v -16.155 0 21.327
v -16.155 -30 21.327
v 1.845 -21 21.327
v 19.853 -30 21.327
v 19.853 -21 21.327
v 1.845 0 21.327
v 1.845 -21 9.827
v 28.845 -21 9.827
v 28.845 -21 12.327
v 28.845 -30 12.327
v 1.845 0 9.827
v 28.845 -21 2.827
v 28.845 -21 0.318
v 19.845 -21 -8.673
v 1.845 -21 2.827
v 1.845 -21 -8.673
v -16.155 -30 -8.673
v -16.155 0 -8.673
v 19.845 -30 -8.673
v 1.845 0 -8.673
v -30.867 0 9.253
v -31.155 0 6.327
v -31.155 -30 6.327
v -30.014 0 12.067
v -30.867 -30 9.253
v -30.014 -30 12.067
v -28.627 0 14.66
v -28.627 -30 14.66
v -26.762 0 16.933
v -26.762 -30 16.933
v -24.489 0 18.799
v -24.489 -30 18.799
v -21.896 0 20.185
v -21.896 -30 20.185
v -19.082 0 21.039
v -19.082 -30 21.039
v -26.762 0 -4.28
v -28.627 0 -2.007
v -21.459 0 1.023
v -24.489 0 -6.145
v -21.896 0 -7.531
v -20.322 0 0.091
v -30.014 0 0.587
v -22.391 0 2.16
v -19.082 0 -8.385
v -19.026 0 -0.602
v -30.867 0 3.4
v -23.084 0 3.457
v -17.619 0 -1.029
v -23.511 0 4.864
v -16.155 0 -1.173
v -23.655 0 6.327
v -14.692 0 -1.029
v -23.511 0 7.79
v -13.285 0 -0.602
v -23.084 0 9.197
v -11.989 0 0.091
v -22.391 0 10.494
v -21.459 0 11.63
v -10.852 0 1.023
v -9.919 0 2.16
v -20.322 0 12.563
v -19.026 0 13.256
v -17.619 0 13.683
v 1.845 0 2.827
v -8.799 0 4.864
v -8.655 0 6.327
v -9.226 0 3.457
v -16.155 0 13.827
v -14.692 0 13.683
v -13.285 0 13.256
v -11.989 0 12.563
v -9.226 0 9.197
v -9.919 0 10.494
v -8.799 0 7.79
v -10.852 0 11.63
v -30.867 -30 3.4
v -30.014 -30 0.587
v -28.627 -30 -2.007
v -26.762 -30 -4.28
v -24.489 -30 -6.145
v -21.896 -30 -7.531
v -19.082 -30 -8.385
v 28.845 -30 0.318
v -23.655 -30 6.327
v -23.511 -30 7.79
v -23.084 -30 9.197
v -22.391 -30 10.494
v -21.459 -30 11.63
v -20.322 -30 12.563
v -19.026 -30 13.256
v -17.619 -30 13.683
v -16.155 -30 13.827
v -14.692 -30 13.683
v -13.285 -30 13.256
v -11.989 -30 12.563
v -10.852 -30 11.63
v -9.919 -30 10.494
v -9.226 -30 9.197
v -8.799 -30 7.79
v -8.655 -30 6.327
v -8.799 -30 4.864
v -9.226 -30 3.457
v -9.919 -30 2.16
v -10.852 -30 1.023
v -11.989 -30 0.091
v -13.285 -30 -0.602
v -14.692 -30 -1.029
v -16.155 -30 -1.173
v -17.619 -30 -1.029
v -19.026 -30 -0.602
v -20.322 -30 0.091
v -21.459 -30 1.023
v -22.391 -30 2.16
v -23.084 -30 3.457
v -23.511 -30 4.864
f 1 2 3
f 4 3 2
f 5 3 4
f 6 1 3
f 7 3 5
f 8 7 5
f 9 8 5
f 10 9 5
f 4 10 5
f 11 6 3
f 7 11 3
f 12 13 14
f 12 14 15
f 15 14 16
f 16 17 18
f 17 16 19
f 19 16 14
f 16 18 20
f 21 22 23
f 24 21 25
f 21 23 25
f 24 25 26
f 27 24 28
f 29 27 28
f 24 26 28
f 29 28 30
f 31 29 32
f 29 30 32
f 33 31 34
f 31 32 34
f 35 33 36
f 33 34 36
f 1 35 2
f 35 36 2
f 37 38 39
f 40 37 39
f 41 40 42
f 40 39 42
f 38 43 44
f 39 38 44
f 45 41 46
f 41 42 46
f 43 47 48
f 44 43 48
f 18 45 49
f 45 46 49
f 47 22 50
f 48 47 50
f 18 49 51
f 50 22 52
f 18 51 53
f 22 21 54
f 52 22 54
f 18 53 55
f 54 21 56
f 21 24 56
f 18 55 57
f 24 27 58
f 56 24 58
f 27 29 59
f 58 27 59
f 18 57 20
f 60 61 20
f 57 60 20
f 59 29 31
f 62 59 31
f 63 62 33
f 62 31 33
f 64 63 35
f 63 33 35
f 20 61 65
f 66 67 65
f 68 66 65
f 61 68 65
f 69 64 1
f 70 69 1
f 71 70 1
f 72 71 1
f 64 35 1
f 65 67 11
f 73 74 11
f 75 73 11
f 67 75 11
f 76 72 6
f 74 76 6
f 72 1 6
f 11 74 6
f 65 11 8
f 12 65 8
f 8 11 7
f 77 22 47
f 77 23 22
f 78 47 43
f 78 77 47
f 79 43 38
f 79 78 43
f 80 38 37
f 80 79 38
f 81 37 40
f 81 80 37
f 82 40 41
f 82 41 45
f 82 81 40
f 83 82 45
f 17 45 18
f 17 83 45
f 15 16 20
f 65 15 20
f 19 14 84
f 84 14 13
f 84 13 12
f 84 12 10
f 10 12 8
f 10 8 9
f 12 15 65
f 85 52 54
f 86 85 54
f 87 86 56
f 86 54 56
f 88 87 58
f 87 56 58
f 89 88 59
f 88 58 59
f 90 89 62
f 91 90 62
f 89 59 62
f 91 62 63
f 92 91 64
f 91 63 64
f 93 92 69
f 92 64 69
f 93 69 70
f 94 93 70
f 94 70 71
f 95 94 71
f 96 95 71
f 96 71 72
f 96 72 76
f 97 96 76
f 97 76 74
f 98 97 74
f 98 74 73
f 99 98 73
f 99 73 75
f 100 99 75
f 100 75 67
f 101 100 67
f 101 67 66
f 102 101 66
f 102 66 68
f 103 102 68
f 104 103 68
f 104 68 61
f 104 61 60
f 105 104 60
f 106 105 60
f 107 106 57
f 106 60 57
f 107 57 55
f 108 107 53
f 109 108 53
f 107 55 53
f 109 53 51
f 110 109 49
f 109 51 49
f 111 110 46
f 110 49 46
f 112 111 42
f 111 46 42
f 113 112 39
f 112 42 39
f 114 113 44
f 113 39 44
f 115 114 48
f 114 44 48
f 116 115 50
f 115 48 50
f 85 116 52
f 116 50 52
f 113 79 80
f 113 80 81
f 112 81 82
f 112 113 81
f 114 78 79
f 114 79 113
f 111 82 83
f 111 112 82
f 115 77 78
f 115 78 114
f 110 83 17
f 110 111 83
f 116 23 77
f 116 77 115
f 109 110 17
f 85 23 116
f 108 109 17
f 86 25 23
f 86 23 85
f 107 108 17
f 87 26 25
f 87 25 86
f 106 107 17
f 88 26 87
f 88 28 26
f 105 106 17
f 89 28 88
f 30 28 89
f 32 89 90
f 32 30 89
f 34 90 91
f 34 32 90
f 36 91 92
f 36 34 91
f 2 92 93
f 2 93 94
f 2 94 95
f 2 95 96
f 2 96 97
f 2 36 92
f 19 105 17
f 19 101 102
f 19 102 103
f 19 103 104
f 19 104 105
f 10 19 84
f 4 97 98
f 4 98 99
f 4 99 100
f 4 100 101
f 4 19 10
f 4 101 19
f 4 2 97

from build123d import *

# Parameters (mm, degrees)
F0_W      = 60
F0_H      = 30
F1_DEPTH  = 30
F2_R      = 14.99999
F4_DEPTH  = 45.974
F5_DEPTH  = 11.5
F7_DEPTH  = 11.5
F8_R      = 7.5
F9_DEPTH  = 31
F11_DEPTH = 25.4
F13_DEPTH = 25.4


# Not quite as in the source:
# - a fillet or chamfer is up to 0.001 mm smaller than in the source, because OpenCascade refuses the exact size


with BuildPart() as f1:
    # F0 (on Front) → F1 (new body)
    with BuildSketch(Plane.XZ):
        with Locations((-1.155378297, 6.3267682405)):
            Rectangle(F0_W, F0_H)
    extrude(amount=F1_DEPTH)

    # F2 (radius 15 in the source; OpenCascade refuses exactly that, so slightly less here)
    f2_edges = [f1.edges().sort_by_distance(p)[0] for p in [
        (-31.155378, -15, 21.326768),
        (-31.155378, -15, -8.673232),
    ]]
    fillet(f2_edges, radius=F2_R)

    # F3 (on face) → F4 (cut)
    with BuildSketch(Plane.XY.offset(21.3267682405)):
        Polygon((28.844621703, 0), (1.844621703, 0), (28.844621703, -21), align=None)
    extrude(amount=-F4_DEPTH, mode=Mode.SUBTRACT)

    # F3 (on face) → F5 (cut)
    with BuildSketch(Plane.XY.offset(21.3267682405)):
        Polygon((28.844621703, -21), (1.844621703, 0), (1.844621703, -21), align=None)
    extrude(amount=-F5_DEPTH, mode=Mode.SUBTRACT)

    # F6 (on face) → F7 (cut)
    with BuildSketch(Plane(origin=(0, 0, -8.6732317595), x_dir=(1, 0, 0), z_dir=(0, 0, -1))):
        Polygon((1.844621703, 21), (1.844621703, 0), (28.844621703, 21), align=None)
    extrude(amount=-F7_DEPTH, mode=Mode.SUBTRACT)

    # F8 (on face) → F9 (cut)
    with BuildSketch(Plane(origin=(0, 0, 0), x_dir=(-1, 0, 0), z_dir=(0, 1, 0))):
        with Locations((16.155378297, 6.3267682405)):
            Circle(F8_R)
    extrude(amount=-F9_DEPTH, mode=Mode.SUBTRACT)

    # F10 (on face) → F11 (cut)
    with BuildSketch(Plane(origin=(0, -21, 0), x_dir=(-1, 0, 0), z_dir=(0, 1, 0))):
        Polygon((-28.844621703, 0.3183682405), (-28.844621703, -8.6732317595), (-19.844621703, -8.6732317595), align=None)
    extrude(amount=-F11_DEPTH, mode=Mode.SUBTRACT)

    # F12 (on face) → F13 (cut)
    with BuildSketch(Plane(origin=(0, -21, 0), x_dir=(-1, 0, 0), z_dir=(0, 1, 0))):
        Polygon((-19.853021703, 21.3267682405), (-28.844621703, 21.3267682405), (-28.844621703, 12.3267682405), align=None)
    extrude(amount=-F13_DEPTH, mode=Mode.SUBTRACT)


solid = f1.part
